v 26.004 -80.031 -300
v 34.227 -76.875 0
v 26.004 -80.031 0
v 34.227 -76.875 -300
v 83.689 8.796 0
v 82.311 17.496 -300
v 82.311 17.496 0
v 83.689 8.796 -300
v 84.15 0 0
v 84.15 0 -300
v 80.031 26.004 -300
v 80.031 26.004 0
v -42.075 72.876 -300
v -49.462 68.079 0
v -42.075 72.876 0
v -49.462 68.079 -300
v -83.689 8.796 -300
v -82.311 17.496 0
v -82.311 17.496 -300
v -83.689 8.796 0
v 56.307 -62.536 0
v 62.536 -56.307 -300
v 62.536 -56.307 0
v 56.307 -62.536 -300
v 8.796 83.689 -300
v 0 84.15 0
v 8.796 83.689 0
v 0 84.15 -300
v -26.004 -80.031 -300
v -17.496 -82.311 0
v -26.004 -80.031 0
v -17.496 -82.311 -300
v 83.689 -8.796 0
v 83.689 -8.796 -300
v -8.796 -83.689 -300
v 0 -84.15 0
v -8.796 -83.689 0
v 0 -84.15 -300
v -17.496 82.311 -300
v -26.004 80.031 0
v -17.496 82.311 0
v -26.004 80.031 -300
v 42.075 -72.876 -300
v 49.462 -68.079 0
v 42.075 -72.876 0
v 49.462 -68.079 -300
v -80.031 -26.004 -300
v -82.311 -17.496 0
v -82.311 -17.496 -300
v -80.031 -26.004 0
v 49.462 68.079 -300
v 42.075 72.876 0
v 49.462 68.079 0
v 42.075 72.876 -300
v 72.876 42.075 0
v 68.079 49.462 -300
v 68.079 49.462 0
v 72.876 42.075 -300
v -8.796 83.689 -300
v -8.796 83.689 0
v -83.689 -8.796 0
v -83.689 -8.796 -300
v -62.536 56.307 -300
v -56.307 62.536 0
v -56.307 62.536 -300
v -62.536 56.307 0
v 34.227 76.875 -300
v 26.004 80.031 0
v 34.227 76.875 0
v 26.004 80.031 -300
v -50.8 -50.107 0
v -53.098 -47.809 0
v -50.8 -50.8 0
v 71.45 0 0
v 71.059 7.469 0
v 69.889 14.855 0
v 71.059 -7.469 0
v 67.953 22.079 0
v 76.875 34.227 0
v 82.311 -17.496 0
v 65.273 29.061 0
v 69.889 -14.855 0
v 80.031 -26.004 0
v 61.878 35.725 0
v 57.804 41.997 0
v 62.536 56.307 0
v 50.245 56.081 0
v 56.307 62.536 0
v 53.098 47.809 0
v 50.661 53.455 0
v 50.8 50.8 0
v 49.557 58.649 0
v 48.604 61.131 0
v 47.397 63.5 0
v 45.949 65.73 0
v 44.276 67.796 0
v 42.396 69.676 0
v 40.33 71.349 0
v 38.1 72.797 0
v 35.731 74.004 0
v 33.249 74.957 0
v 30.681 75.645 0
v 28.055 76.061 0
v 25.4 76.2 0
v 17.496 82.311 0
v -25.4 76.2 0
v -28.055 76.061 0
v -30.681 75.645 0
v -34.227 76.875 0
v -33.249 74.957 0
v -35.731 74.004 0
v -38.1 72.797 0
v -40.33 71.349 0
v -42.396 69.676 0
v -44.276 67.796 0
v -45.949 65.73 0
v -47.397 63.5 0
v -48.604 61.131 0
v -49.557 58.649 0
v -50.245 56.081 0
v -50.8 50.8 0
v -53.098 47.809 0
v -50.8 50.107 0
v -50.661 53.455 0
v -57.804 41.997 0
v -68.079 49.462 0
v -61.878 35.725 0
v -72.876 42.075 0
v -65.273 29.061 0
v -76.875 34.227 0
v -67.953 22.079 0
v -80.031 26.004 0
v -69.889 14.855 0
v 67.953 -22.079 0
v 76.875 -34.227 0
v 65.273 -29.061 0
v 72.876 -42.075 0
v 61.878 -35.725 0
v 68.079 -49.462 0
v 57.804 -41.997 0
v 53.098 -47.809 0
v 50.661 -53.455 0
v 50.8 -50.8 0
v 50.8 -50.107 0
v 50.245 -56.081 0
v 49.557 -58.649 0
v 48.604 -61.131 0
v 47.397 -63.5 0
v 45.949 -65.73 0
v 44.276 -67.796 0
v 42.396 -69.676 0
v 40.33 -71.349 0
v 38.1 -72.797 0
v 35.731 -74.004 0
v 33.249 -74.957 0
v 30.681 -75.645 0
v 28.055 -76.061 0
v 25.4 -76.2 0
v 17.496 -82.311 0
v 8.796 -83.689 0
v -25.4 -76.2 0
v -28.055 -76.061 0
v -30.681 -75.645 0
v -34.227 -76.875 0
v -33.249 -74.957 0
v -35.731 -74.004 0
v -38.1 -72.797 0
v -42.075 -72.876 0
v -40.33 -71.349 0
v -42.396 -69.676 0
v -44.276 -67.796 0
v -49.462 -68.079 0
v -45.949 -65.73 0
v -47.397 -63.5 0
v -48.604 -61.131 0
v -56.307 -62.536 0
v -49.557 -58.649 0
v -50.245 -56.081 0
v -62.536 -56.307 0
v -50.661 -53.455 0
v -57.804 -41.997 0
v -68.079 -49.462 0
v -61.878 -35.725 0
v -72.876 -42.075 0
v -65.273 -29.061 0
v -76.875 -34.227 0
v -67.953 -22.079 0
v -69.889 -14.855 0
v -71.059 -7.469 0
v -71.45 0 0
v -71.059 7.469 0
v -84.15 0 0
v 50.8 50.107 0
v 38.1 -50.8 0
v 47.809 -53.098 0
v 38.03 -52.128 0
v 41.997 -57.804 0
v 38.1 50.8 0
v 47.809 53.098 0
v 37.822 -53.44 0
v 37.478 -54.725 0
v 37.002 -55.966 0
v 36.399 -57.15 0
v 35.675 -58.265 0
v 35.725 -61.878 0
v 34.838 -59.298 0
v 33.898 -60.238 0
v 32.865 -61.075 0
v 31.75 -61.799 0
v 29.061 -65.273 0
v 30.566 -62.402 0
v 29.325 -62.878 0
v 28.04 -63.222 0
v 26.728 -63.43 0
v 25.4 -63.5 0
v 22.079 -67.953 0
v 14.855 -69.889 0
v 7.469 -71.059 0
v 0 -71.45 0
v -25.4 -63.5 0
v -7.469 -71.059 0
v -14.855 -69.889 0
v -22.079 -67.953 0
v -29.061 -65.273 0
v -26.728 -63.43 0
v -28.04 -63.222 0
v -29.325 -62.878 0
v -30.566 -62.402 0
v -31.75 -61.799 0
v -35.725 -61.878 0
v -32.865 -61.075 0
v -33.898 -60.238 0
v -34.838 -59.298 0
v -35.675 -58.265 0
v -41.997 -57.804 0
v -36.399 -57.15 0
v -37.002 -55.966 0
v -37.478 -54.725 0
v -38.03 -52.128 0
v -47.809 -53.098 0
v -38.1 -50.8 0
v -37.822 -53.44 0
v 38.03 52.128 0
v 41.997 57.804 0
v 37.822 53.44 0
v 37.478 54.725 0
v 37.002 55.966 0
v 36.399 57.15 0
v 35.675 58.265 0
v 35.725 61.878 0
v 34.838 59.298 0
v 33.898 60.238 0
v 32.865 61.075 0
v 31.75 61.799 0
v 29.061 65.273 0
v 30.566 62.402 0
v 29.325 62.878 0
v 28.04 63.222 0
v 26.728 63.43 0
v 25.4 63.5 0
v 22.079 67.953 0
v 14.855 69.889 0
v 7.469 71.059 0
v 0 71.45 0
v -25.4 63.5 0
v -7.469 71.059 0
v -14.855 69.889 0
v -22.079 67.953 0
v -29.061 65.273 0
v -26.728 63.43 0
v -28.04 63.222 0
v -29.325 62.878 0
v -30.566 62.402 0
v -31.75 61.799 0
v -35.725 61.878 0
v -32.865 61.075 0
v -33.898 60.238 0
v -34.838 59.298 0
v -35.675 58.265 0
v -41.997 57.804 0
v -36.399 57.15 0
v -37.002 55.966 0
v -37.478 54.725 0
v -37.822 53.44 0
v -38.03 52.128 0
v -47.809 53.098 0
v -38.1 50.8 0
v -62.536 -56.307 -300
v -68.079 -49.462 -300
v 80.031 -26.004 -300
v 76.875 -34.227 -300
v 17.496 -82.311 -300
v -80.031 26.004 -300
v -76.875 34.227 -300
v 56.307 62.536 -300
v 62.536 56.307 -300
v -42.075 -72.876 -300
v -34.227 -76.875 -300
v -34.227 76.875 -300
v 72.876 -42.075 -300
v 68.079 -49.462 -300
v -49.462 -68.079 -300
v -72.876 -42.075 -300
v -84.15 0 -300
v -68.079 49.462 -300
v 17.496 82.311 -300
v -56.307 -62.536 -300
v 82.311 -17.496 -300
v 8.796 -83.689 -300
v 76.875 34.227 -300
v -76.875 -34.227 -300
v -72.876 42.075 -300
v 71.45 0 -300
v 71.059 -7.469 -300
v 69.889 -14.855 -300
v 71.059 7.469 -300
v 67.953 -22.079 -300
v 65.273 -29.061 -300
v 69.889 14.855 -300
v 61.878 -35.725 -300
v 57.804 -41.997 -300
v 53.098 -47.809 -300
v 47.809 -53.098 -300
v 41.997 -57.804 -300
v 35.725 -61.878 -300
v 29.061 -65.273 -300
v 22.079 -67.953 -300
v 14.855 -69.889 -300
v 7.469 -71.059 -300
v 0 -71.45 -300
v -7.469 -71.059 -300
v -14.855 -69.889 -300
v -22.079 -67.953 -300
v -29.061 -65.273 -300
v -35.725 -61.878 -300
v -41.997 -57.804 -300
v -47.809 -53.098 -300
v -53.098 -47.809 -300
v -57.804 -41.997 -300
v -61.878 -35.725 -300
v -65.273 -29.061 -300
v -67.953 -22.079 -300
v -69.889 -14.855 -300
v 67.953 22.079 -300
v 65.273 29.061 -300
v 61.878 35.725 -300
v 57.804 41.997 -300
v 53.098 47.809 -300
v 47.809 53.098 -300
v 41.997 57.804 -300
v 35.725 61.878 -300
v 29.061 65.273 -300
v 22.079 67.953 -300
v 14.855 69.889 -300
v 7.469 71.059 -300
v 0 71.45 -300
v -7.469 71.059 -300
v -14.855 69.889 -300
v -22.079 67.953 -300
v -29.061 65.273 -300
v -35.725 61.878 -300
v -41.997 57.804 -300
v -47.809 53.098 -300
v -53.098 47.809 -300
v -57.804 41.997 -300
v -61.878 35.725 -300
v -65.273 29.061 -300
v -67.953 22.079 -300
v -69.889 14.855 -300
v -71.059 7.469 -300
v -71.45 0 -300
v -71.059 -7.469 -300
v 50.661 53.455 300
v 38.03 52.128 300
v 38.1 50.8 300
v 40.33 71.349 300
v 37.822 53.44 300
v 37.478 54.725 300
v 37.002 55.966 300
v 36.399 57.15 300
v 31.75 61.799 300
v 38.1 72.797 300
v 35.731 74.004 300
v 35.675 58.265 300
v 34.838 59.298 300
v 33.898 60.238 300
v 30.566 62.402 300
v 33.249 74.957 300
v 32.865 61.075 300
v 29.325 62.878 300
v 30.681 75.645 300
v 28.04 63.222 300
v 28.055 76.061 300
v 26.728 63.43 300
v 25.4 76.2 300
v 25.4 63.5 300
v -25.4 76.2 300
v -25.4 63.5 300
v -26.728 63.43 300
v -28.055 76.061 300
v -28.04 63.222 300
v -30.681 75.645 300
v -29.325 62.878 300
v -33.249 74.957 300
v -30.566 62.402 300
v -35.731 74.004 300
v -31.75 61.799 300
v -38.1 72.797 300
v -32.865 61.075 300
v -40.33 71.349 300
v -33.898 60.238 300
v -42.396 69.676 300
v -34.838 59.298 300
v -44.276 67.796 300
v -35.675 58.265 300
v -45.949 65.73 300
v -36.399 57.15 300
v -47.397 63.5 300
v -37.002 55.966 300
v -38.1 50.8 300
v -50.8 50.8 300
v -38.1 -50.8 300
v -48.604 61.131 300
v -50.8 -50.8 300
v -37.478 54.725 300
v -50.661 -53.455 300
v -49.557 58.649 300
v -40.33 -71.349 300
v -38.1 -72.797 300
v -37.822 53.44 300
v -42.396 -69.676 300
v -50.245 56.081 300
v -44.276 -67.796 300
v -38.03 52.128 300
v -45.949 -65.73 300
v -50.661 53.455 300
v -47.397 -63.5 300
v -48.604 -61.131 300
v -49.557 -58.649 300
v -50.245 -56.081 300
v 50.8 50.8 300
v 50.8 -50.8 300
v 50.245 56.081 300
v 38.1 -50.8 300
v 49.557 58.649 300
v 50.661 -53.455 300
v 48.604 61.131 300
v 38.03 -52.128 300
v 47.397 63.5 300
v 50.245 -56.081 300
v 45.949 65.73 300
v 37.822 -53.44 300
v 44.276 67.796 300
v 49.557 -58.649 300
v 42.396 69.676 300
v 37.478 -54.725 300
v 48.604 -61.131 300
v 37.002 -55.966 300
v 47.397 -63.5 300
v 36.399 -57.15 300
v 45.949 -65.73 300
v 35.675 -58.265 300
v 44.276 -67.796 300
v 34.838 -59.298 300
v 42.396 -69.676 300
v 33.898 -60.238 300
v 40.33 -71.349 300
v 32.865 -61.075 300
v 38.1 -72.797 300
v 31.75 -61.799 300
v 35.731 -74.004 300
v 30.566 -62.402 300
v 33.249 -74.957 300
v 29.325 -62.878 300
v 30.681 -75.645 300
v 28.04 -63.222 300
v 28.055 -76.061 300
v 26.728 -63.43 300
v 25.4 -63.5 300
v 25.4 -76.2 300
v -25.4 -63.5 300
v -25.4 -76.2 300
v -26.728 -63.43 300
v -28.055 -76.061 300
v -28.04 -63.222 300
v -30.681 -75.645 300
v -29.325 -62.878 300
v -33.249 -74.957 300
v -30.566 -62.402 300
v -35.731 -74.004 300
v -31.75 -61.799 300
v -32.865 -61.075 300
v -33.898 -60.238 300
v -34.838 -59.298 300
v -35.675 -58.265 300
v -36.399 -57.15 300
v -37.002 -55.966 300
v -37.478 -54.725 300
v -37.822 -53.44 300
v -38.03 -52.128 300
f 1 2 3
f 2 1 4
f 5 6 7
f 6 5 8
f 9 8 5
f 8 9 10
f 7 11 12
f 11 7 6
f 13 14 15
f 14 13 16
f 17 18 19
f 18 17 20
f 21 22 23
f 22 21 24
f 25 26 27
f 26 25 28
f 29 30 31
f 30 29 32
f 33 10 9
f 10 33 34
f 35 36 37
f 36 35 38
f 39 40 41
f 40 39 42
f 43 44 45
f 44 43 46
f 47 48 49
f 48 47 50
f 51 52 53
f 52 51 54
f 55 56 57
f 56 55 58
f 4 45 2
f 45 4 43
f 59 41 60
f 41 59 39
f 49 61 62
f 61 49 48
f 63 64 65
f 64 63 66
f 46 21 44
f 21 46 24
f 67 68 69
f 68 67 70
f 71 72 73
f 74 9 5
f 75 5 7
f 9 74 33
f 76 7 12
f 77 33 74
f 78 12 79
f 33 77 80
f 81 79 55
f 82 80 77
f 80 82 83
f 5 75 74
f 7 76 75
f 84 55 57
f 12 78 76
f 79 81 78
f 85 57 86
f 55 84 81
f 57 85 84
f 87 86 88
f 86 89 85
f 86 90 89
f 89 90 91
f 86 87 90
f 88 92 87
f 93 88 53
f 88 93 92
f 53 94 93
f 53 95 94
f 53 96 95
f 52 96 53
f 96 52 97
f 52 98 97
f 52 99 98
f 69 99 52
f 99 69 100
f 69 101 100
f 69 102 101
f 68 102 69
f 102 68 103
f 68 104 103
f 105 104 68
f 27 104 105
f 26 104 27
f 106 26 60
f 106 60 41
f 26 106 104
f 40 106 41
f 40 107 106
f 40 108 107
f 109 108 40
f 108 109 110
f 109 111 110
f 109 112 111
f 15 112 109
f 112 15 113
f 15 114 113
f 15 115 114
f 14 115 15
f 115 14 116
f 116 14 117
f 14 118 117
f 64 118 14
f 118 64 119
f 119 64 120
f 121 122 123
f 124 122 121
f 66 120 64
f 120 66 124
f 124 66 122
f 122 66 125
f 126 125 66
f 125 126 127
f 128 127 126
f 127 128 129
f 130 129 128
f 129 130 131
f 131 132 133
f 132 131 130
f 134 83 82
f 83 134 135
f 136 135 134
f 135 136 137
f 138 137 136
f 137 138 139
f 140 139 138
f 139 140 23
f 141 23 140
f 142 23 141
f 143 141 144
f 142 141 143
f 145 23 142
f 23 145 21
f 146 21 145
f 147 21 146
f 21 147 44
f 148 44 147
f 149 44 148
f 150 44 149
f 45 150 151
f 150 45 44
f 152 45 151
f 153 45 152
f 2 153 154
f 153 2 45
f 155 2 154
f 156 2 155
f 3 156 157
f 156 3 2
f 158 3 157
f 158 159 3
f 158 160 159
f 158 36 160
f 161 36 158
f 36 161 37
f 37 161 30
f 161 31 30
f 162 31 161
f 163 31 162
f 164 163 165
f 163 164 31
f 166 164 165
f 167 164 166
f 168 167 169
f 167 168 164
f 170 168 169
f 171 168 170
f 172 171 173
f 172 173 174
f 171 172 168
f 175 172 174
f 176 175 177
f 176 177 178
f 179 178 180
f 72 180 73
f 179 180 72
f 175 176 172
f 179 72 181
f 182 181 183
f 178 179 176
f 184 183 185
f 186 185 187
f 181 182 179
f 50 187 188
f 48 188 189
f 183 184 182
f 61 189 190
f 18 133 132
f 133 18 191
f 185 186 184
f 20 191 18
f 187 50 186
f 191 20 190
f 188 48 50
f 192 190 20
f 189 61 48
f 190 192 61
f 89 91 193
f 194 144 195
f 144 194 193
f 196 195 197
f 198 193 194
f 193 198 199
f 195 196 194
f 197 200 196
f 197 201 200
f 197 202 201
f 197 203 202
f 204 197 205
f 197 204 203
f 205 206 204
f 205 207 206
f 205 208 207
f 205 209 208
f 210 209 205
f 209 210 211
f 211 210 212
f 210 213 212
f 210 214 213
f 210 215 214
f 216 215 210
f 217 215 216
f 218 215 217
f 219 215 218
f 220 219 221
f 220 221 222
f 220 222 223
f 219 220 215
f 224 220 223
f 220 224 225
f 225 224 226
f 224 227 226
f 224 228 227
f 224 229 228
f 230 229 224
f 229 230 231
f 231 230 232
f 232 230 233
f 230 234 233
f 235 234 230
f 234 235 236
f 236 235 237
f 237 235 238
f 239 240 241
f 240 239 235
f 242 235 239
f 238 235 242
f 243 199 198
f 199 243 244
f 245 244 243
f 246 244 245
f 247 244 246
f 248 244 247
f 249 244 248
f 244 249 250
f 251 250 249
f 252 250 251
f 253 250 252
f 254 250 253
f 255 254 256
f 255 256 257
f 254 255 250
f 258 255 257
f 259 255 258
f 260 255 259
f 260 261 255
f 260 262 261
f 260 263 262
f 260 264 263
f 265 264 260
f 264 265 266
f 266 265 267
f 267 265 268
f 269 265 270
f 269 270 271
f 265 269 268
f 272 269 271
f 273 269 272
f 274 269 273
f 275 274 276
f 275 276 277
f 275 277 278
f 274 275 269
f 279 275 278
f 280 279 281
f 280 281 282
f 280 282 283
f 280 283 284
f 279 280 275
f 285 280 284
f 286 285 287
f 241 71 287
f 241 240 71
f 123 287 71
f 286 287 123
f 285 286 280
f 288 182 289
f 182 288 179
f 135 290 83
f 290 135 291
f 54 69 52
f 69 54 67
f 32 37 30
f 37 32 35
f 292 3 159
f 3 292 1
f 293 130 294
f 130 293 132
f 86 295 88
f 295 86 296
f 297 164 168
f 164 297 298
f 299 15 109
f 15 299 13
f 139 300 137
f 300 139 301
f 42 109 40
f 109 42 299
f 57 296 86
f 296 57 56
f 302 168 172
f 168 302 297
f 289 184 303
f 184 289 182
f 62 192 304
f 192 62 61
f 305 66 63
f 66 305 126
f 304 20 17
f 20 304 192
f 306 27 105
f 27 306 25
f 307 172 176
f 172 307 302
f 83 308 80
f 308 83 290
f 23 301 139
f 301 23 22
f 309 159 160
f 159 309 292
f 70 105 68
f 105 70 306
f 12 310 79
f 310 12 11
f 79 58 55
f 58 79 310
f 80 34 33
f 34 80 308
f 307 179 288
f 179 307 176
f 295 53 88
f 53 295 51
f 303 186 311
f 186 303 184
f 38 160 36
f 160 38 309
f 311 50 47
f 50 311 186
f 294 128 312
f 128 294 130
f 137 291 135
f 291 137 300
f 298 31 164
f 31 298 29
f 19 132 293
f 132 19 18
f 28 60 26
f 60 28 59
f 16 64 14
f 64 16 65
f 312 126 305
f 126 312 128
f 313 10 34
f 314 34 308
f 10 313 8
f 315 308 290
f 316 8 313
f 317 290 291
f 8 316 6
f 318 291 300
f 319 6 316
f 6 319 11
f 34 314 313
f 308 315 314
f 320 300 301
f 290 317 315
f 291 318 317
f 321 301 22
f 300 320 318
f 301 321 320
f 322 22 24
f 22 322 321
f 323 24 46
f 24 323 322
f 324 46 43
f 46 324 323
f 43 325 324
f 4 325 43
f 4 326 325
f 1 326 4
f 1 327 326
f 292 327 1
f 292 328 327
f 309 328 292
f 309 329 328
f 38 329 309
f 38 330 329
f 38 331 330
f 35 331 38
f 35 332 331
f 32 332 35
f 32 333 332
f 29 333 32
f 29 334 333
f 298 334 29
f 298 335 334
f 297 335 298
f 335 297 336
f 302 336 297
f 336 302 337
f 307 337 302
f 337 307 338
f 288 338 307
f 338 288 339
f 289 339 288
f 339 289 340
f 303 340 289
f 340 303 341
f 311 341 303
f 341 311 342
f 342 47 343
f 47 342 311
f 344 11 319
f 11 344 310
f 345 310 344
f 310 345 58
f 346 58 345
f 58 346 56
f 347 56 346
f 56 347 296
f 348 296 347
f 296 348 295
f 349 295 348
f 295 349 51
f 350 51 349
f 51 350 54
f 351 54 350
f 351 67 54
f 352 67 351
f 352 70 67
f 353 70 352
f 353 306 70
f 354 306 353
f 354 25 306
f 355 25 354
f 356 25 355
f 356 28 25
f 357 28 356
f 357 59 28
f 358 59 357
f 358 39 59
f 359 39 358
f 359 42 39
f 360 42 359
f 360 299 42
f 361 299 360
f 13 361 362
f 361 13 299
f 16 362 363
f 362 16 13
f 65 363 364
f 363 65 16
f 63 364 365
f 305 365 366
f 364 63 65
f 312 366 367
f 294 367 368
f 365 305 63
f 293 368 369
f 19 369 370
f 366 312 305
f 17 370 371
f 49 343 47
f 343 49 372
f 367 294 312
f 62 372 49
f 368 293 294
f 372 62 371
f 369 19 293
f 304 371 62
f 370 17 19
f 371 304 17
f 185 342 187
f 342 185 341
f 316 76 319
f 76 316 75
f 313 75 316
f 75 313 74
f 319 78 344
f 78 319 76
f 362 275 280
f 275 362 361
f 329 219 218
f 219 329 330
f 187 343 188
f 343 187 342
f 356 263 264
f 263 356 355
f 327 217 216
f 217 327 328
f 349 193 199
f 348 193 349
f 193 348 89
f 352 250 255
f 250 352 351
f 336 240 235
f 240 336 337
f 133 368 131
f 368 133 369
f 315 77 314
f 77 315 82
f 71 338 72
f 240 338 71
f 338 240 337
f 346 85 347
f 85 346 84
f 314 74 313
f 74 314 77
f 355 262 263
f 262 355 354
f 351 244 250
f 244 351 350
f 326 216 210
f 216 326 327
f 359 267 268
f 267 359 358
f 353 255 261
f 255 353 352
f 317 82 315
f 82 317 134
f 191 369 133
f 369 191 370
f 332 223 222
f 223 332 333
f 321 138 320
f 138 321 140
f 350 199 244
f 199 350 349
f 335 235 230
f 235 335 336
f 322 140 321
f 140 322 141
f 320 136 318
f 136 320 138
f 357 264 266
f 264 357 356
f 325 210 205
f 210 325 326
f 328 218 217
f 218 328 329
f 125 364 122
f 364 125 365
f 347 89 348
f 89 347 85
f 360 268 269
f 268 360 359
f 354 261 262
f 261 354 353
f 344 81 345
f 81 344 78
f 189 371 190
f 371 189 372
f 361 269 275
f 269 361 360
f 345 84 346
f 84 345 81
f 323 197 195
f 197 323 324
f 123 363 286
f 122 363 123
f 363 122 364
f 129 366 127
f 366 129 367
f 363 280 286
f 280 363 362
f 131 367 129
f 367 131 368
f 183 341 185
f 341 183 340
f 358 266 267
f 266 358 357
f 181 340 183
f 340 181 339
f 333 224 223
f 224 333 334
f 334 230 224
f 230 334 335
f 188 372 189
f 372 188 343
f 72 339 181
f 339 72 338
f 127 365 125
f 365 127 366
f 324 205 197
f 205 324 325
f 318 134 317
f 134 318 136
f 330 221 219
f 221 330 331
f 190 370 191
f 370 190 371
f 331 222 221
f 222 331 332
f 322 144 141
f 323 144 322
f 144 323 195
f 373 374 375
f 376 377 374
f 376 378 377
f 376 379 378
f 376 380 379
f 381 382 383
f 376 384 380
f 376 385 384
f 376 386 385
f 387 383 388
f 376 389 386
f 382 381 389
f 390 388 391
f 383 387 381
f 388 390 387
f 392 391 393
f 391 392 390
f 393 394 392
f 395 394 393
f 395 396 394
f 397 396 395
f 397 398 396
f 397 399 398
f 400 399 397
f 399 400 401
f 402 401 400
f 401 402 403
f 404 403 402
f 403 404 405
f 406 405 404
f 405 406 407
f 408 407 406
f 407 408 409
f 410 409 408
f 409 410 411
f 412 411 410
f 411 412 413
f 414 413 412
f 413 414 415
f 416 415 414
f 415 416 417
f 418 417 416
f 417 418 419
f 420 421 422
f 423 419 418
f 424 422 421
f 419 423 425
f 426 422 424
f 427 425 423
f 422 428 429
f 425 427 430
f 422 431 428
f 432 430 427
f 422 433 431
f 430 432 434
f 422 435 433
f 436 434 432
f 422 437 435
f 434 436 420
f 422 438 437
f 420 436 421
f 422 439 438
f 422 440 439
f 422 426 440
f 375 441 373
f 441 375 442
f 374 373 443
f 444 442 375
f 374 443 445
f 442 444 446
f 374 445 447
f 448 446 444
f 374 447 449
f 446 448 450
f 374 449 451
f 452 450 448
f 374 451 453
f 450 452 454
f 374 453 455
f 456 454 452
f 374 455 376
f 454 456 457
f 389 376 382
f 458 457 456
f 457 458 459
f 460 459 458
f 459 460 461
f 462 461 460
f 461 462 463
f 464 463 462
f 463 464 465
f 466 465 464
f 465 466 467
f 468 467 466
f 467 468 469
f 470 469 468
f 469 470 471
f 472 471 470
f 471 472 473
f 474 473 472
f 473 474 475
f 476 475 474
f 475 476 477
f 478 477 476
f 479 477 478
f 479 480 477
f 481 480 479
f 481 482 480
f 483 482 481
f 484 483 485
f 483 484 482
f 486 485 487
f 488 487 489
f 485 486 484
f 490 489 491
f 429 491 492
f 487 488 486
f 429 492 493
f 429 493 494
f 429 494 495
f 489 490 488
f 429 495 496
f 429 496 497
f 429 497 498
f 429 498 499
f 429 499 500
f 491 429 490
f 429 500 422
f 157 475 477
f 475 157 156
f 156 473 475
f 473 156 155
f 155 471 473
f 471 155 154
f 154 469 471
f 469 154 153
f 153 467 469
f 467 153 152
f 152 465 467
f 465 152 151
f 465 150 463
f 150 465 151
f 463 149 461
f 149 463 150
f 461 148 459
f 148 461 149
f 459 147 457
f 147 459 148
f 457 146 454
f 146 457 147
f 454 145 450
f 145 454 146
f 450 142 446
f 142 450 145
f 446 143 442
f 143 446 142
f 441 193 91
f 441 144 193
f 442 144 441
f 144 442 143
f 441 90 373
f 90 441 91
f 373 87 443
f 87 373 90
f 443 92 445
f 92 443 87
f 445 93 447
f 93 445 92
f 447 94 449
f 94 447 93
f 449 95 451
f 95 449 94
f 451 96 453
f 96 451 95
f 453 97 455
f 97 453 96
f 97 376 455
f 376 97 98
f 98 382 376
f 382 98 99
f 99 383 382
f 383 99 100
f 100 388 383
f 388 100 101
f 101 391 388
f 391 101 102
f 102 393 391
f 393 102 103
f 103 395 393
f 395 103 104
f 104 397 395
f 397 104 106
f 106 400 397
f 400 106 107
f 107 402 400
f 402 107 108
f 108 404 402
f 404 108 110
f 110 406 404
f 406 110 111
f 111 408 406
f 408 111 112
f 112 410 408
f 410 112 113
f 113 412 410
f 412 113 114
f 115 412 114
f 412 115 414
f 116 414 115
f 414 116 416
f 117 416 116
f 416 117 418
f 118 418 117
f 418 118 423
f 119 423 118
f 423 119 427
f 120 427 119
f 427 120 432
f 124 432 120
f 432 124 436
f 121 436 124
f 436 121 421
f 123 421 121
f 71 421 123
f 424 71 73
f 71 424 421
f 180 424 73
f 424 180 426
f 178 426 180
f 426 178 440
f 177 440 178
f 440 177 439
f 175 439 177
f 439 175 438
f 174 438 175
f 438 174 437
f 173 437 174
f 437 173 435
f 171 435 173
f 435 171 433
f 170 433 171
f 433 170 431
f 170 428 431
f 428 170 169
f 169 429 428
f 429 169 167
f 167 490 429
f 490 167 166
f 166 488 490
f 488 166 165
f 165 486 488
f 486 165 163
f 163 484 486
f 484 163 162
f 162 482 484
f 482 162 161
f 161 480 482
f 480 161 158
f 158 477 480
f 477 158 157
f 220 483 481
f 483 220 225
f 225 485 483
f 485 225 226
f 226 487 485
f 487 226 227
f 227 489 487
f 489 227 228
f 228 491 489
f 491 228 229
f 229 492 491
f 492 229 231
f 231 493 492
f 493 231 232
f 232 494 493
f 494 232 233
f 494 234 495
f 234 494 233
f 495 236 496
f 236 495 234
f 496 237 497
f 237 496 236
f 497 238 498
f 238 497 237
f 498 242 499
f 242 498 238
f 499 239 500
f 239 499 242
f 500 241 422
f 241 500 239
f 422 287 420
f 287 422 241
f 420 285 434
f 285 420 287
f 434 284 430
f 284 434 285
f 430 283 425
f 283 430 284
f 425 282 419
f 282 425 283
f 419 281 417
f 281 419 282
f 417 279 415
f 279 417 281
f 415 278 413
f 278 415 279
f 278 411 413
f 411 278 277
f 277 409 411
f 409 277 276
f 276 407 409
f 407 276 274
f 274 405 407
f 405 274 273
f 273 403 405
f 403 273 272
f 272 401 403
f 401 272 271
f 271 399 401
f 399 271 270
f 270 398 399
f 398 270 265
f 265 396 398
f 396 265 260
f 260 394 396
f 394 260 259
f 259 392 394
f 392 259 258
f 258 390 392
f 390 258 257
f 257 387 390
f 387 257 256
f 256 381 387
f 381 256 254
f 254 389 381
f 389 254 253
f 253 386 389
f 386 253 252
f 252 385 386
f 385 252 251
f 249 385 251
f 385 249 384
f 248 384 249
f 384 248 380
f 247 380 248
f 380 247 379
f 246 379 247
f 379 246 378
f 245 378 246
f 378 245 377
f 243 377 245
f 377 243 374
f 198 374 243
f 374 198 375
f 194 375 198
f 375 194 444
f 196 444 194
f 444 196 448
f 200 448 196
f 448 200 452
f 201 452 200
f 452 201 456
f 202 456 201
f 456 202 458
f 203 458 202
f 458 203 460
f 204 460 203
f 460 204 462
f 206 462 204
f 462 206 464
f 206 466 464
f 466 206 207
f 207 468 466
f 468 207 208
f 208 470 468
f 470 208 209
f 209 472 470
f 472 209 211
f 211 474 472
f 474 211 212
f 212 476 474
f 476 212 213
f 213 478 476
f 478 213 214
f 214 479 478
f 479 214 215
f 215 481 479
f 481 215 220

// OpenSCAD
module HSSsolid(d,b,r) {
    d2 = d/2;
    b2 = b/2;
    pts = [ [b2,d2-r],     // upper right corner
            [b2-r,d2],
            [-(b2-r),d2],  // upper left
            [-b2,d2-r],
            [-b2,-(d2-r)],  // lower left
            [-(b2-r),-d2],
            [b2-r,-d2],     // lower right
            [b2,-(d2-r)]];
    union() {
        polygon(pts);
        translate([b2-r,d2-r,0]) circle(r=r,$fn=60);
        translate([-(b2-r),d2-r,0]) circle(r=r,$fn=60);
        translate([-(b2-r),-(d2-r),0]) circle(r=r,$fn=60);
        translate([b2-r,-(d2-r),0]) circle(r=r,$fn=60);
    }
}


module HSS(d,b,t,l=300,r1=undef,r2=undef) {    
    r1 = r1 == undef ? 2*t : r1;
    r2 = r2 == undef ? r1-t : r2;
    
    linear_extrude(height=l) {
        difference() {
            HSSsolid(d,b,r1);
            HSSsolid(d-2*t,b-2*t,r2);
        }
    }
}

module HSS_round(od,t,l=300) {
    difference() {
        cylinder(d=od,h=l,$fn=60);
        cylinder(d=od-2*t,h=l,$fn=60);
    }
}

render() {
    HSS(152.4,101.6,12.7); // HSS 152x102x13  (G40)
    translate([0,0,-300]) HSS_round(168.3,12.7); // HSS 168x13
}
    
